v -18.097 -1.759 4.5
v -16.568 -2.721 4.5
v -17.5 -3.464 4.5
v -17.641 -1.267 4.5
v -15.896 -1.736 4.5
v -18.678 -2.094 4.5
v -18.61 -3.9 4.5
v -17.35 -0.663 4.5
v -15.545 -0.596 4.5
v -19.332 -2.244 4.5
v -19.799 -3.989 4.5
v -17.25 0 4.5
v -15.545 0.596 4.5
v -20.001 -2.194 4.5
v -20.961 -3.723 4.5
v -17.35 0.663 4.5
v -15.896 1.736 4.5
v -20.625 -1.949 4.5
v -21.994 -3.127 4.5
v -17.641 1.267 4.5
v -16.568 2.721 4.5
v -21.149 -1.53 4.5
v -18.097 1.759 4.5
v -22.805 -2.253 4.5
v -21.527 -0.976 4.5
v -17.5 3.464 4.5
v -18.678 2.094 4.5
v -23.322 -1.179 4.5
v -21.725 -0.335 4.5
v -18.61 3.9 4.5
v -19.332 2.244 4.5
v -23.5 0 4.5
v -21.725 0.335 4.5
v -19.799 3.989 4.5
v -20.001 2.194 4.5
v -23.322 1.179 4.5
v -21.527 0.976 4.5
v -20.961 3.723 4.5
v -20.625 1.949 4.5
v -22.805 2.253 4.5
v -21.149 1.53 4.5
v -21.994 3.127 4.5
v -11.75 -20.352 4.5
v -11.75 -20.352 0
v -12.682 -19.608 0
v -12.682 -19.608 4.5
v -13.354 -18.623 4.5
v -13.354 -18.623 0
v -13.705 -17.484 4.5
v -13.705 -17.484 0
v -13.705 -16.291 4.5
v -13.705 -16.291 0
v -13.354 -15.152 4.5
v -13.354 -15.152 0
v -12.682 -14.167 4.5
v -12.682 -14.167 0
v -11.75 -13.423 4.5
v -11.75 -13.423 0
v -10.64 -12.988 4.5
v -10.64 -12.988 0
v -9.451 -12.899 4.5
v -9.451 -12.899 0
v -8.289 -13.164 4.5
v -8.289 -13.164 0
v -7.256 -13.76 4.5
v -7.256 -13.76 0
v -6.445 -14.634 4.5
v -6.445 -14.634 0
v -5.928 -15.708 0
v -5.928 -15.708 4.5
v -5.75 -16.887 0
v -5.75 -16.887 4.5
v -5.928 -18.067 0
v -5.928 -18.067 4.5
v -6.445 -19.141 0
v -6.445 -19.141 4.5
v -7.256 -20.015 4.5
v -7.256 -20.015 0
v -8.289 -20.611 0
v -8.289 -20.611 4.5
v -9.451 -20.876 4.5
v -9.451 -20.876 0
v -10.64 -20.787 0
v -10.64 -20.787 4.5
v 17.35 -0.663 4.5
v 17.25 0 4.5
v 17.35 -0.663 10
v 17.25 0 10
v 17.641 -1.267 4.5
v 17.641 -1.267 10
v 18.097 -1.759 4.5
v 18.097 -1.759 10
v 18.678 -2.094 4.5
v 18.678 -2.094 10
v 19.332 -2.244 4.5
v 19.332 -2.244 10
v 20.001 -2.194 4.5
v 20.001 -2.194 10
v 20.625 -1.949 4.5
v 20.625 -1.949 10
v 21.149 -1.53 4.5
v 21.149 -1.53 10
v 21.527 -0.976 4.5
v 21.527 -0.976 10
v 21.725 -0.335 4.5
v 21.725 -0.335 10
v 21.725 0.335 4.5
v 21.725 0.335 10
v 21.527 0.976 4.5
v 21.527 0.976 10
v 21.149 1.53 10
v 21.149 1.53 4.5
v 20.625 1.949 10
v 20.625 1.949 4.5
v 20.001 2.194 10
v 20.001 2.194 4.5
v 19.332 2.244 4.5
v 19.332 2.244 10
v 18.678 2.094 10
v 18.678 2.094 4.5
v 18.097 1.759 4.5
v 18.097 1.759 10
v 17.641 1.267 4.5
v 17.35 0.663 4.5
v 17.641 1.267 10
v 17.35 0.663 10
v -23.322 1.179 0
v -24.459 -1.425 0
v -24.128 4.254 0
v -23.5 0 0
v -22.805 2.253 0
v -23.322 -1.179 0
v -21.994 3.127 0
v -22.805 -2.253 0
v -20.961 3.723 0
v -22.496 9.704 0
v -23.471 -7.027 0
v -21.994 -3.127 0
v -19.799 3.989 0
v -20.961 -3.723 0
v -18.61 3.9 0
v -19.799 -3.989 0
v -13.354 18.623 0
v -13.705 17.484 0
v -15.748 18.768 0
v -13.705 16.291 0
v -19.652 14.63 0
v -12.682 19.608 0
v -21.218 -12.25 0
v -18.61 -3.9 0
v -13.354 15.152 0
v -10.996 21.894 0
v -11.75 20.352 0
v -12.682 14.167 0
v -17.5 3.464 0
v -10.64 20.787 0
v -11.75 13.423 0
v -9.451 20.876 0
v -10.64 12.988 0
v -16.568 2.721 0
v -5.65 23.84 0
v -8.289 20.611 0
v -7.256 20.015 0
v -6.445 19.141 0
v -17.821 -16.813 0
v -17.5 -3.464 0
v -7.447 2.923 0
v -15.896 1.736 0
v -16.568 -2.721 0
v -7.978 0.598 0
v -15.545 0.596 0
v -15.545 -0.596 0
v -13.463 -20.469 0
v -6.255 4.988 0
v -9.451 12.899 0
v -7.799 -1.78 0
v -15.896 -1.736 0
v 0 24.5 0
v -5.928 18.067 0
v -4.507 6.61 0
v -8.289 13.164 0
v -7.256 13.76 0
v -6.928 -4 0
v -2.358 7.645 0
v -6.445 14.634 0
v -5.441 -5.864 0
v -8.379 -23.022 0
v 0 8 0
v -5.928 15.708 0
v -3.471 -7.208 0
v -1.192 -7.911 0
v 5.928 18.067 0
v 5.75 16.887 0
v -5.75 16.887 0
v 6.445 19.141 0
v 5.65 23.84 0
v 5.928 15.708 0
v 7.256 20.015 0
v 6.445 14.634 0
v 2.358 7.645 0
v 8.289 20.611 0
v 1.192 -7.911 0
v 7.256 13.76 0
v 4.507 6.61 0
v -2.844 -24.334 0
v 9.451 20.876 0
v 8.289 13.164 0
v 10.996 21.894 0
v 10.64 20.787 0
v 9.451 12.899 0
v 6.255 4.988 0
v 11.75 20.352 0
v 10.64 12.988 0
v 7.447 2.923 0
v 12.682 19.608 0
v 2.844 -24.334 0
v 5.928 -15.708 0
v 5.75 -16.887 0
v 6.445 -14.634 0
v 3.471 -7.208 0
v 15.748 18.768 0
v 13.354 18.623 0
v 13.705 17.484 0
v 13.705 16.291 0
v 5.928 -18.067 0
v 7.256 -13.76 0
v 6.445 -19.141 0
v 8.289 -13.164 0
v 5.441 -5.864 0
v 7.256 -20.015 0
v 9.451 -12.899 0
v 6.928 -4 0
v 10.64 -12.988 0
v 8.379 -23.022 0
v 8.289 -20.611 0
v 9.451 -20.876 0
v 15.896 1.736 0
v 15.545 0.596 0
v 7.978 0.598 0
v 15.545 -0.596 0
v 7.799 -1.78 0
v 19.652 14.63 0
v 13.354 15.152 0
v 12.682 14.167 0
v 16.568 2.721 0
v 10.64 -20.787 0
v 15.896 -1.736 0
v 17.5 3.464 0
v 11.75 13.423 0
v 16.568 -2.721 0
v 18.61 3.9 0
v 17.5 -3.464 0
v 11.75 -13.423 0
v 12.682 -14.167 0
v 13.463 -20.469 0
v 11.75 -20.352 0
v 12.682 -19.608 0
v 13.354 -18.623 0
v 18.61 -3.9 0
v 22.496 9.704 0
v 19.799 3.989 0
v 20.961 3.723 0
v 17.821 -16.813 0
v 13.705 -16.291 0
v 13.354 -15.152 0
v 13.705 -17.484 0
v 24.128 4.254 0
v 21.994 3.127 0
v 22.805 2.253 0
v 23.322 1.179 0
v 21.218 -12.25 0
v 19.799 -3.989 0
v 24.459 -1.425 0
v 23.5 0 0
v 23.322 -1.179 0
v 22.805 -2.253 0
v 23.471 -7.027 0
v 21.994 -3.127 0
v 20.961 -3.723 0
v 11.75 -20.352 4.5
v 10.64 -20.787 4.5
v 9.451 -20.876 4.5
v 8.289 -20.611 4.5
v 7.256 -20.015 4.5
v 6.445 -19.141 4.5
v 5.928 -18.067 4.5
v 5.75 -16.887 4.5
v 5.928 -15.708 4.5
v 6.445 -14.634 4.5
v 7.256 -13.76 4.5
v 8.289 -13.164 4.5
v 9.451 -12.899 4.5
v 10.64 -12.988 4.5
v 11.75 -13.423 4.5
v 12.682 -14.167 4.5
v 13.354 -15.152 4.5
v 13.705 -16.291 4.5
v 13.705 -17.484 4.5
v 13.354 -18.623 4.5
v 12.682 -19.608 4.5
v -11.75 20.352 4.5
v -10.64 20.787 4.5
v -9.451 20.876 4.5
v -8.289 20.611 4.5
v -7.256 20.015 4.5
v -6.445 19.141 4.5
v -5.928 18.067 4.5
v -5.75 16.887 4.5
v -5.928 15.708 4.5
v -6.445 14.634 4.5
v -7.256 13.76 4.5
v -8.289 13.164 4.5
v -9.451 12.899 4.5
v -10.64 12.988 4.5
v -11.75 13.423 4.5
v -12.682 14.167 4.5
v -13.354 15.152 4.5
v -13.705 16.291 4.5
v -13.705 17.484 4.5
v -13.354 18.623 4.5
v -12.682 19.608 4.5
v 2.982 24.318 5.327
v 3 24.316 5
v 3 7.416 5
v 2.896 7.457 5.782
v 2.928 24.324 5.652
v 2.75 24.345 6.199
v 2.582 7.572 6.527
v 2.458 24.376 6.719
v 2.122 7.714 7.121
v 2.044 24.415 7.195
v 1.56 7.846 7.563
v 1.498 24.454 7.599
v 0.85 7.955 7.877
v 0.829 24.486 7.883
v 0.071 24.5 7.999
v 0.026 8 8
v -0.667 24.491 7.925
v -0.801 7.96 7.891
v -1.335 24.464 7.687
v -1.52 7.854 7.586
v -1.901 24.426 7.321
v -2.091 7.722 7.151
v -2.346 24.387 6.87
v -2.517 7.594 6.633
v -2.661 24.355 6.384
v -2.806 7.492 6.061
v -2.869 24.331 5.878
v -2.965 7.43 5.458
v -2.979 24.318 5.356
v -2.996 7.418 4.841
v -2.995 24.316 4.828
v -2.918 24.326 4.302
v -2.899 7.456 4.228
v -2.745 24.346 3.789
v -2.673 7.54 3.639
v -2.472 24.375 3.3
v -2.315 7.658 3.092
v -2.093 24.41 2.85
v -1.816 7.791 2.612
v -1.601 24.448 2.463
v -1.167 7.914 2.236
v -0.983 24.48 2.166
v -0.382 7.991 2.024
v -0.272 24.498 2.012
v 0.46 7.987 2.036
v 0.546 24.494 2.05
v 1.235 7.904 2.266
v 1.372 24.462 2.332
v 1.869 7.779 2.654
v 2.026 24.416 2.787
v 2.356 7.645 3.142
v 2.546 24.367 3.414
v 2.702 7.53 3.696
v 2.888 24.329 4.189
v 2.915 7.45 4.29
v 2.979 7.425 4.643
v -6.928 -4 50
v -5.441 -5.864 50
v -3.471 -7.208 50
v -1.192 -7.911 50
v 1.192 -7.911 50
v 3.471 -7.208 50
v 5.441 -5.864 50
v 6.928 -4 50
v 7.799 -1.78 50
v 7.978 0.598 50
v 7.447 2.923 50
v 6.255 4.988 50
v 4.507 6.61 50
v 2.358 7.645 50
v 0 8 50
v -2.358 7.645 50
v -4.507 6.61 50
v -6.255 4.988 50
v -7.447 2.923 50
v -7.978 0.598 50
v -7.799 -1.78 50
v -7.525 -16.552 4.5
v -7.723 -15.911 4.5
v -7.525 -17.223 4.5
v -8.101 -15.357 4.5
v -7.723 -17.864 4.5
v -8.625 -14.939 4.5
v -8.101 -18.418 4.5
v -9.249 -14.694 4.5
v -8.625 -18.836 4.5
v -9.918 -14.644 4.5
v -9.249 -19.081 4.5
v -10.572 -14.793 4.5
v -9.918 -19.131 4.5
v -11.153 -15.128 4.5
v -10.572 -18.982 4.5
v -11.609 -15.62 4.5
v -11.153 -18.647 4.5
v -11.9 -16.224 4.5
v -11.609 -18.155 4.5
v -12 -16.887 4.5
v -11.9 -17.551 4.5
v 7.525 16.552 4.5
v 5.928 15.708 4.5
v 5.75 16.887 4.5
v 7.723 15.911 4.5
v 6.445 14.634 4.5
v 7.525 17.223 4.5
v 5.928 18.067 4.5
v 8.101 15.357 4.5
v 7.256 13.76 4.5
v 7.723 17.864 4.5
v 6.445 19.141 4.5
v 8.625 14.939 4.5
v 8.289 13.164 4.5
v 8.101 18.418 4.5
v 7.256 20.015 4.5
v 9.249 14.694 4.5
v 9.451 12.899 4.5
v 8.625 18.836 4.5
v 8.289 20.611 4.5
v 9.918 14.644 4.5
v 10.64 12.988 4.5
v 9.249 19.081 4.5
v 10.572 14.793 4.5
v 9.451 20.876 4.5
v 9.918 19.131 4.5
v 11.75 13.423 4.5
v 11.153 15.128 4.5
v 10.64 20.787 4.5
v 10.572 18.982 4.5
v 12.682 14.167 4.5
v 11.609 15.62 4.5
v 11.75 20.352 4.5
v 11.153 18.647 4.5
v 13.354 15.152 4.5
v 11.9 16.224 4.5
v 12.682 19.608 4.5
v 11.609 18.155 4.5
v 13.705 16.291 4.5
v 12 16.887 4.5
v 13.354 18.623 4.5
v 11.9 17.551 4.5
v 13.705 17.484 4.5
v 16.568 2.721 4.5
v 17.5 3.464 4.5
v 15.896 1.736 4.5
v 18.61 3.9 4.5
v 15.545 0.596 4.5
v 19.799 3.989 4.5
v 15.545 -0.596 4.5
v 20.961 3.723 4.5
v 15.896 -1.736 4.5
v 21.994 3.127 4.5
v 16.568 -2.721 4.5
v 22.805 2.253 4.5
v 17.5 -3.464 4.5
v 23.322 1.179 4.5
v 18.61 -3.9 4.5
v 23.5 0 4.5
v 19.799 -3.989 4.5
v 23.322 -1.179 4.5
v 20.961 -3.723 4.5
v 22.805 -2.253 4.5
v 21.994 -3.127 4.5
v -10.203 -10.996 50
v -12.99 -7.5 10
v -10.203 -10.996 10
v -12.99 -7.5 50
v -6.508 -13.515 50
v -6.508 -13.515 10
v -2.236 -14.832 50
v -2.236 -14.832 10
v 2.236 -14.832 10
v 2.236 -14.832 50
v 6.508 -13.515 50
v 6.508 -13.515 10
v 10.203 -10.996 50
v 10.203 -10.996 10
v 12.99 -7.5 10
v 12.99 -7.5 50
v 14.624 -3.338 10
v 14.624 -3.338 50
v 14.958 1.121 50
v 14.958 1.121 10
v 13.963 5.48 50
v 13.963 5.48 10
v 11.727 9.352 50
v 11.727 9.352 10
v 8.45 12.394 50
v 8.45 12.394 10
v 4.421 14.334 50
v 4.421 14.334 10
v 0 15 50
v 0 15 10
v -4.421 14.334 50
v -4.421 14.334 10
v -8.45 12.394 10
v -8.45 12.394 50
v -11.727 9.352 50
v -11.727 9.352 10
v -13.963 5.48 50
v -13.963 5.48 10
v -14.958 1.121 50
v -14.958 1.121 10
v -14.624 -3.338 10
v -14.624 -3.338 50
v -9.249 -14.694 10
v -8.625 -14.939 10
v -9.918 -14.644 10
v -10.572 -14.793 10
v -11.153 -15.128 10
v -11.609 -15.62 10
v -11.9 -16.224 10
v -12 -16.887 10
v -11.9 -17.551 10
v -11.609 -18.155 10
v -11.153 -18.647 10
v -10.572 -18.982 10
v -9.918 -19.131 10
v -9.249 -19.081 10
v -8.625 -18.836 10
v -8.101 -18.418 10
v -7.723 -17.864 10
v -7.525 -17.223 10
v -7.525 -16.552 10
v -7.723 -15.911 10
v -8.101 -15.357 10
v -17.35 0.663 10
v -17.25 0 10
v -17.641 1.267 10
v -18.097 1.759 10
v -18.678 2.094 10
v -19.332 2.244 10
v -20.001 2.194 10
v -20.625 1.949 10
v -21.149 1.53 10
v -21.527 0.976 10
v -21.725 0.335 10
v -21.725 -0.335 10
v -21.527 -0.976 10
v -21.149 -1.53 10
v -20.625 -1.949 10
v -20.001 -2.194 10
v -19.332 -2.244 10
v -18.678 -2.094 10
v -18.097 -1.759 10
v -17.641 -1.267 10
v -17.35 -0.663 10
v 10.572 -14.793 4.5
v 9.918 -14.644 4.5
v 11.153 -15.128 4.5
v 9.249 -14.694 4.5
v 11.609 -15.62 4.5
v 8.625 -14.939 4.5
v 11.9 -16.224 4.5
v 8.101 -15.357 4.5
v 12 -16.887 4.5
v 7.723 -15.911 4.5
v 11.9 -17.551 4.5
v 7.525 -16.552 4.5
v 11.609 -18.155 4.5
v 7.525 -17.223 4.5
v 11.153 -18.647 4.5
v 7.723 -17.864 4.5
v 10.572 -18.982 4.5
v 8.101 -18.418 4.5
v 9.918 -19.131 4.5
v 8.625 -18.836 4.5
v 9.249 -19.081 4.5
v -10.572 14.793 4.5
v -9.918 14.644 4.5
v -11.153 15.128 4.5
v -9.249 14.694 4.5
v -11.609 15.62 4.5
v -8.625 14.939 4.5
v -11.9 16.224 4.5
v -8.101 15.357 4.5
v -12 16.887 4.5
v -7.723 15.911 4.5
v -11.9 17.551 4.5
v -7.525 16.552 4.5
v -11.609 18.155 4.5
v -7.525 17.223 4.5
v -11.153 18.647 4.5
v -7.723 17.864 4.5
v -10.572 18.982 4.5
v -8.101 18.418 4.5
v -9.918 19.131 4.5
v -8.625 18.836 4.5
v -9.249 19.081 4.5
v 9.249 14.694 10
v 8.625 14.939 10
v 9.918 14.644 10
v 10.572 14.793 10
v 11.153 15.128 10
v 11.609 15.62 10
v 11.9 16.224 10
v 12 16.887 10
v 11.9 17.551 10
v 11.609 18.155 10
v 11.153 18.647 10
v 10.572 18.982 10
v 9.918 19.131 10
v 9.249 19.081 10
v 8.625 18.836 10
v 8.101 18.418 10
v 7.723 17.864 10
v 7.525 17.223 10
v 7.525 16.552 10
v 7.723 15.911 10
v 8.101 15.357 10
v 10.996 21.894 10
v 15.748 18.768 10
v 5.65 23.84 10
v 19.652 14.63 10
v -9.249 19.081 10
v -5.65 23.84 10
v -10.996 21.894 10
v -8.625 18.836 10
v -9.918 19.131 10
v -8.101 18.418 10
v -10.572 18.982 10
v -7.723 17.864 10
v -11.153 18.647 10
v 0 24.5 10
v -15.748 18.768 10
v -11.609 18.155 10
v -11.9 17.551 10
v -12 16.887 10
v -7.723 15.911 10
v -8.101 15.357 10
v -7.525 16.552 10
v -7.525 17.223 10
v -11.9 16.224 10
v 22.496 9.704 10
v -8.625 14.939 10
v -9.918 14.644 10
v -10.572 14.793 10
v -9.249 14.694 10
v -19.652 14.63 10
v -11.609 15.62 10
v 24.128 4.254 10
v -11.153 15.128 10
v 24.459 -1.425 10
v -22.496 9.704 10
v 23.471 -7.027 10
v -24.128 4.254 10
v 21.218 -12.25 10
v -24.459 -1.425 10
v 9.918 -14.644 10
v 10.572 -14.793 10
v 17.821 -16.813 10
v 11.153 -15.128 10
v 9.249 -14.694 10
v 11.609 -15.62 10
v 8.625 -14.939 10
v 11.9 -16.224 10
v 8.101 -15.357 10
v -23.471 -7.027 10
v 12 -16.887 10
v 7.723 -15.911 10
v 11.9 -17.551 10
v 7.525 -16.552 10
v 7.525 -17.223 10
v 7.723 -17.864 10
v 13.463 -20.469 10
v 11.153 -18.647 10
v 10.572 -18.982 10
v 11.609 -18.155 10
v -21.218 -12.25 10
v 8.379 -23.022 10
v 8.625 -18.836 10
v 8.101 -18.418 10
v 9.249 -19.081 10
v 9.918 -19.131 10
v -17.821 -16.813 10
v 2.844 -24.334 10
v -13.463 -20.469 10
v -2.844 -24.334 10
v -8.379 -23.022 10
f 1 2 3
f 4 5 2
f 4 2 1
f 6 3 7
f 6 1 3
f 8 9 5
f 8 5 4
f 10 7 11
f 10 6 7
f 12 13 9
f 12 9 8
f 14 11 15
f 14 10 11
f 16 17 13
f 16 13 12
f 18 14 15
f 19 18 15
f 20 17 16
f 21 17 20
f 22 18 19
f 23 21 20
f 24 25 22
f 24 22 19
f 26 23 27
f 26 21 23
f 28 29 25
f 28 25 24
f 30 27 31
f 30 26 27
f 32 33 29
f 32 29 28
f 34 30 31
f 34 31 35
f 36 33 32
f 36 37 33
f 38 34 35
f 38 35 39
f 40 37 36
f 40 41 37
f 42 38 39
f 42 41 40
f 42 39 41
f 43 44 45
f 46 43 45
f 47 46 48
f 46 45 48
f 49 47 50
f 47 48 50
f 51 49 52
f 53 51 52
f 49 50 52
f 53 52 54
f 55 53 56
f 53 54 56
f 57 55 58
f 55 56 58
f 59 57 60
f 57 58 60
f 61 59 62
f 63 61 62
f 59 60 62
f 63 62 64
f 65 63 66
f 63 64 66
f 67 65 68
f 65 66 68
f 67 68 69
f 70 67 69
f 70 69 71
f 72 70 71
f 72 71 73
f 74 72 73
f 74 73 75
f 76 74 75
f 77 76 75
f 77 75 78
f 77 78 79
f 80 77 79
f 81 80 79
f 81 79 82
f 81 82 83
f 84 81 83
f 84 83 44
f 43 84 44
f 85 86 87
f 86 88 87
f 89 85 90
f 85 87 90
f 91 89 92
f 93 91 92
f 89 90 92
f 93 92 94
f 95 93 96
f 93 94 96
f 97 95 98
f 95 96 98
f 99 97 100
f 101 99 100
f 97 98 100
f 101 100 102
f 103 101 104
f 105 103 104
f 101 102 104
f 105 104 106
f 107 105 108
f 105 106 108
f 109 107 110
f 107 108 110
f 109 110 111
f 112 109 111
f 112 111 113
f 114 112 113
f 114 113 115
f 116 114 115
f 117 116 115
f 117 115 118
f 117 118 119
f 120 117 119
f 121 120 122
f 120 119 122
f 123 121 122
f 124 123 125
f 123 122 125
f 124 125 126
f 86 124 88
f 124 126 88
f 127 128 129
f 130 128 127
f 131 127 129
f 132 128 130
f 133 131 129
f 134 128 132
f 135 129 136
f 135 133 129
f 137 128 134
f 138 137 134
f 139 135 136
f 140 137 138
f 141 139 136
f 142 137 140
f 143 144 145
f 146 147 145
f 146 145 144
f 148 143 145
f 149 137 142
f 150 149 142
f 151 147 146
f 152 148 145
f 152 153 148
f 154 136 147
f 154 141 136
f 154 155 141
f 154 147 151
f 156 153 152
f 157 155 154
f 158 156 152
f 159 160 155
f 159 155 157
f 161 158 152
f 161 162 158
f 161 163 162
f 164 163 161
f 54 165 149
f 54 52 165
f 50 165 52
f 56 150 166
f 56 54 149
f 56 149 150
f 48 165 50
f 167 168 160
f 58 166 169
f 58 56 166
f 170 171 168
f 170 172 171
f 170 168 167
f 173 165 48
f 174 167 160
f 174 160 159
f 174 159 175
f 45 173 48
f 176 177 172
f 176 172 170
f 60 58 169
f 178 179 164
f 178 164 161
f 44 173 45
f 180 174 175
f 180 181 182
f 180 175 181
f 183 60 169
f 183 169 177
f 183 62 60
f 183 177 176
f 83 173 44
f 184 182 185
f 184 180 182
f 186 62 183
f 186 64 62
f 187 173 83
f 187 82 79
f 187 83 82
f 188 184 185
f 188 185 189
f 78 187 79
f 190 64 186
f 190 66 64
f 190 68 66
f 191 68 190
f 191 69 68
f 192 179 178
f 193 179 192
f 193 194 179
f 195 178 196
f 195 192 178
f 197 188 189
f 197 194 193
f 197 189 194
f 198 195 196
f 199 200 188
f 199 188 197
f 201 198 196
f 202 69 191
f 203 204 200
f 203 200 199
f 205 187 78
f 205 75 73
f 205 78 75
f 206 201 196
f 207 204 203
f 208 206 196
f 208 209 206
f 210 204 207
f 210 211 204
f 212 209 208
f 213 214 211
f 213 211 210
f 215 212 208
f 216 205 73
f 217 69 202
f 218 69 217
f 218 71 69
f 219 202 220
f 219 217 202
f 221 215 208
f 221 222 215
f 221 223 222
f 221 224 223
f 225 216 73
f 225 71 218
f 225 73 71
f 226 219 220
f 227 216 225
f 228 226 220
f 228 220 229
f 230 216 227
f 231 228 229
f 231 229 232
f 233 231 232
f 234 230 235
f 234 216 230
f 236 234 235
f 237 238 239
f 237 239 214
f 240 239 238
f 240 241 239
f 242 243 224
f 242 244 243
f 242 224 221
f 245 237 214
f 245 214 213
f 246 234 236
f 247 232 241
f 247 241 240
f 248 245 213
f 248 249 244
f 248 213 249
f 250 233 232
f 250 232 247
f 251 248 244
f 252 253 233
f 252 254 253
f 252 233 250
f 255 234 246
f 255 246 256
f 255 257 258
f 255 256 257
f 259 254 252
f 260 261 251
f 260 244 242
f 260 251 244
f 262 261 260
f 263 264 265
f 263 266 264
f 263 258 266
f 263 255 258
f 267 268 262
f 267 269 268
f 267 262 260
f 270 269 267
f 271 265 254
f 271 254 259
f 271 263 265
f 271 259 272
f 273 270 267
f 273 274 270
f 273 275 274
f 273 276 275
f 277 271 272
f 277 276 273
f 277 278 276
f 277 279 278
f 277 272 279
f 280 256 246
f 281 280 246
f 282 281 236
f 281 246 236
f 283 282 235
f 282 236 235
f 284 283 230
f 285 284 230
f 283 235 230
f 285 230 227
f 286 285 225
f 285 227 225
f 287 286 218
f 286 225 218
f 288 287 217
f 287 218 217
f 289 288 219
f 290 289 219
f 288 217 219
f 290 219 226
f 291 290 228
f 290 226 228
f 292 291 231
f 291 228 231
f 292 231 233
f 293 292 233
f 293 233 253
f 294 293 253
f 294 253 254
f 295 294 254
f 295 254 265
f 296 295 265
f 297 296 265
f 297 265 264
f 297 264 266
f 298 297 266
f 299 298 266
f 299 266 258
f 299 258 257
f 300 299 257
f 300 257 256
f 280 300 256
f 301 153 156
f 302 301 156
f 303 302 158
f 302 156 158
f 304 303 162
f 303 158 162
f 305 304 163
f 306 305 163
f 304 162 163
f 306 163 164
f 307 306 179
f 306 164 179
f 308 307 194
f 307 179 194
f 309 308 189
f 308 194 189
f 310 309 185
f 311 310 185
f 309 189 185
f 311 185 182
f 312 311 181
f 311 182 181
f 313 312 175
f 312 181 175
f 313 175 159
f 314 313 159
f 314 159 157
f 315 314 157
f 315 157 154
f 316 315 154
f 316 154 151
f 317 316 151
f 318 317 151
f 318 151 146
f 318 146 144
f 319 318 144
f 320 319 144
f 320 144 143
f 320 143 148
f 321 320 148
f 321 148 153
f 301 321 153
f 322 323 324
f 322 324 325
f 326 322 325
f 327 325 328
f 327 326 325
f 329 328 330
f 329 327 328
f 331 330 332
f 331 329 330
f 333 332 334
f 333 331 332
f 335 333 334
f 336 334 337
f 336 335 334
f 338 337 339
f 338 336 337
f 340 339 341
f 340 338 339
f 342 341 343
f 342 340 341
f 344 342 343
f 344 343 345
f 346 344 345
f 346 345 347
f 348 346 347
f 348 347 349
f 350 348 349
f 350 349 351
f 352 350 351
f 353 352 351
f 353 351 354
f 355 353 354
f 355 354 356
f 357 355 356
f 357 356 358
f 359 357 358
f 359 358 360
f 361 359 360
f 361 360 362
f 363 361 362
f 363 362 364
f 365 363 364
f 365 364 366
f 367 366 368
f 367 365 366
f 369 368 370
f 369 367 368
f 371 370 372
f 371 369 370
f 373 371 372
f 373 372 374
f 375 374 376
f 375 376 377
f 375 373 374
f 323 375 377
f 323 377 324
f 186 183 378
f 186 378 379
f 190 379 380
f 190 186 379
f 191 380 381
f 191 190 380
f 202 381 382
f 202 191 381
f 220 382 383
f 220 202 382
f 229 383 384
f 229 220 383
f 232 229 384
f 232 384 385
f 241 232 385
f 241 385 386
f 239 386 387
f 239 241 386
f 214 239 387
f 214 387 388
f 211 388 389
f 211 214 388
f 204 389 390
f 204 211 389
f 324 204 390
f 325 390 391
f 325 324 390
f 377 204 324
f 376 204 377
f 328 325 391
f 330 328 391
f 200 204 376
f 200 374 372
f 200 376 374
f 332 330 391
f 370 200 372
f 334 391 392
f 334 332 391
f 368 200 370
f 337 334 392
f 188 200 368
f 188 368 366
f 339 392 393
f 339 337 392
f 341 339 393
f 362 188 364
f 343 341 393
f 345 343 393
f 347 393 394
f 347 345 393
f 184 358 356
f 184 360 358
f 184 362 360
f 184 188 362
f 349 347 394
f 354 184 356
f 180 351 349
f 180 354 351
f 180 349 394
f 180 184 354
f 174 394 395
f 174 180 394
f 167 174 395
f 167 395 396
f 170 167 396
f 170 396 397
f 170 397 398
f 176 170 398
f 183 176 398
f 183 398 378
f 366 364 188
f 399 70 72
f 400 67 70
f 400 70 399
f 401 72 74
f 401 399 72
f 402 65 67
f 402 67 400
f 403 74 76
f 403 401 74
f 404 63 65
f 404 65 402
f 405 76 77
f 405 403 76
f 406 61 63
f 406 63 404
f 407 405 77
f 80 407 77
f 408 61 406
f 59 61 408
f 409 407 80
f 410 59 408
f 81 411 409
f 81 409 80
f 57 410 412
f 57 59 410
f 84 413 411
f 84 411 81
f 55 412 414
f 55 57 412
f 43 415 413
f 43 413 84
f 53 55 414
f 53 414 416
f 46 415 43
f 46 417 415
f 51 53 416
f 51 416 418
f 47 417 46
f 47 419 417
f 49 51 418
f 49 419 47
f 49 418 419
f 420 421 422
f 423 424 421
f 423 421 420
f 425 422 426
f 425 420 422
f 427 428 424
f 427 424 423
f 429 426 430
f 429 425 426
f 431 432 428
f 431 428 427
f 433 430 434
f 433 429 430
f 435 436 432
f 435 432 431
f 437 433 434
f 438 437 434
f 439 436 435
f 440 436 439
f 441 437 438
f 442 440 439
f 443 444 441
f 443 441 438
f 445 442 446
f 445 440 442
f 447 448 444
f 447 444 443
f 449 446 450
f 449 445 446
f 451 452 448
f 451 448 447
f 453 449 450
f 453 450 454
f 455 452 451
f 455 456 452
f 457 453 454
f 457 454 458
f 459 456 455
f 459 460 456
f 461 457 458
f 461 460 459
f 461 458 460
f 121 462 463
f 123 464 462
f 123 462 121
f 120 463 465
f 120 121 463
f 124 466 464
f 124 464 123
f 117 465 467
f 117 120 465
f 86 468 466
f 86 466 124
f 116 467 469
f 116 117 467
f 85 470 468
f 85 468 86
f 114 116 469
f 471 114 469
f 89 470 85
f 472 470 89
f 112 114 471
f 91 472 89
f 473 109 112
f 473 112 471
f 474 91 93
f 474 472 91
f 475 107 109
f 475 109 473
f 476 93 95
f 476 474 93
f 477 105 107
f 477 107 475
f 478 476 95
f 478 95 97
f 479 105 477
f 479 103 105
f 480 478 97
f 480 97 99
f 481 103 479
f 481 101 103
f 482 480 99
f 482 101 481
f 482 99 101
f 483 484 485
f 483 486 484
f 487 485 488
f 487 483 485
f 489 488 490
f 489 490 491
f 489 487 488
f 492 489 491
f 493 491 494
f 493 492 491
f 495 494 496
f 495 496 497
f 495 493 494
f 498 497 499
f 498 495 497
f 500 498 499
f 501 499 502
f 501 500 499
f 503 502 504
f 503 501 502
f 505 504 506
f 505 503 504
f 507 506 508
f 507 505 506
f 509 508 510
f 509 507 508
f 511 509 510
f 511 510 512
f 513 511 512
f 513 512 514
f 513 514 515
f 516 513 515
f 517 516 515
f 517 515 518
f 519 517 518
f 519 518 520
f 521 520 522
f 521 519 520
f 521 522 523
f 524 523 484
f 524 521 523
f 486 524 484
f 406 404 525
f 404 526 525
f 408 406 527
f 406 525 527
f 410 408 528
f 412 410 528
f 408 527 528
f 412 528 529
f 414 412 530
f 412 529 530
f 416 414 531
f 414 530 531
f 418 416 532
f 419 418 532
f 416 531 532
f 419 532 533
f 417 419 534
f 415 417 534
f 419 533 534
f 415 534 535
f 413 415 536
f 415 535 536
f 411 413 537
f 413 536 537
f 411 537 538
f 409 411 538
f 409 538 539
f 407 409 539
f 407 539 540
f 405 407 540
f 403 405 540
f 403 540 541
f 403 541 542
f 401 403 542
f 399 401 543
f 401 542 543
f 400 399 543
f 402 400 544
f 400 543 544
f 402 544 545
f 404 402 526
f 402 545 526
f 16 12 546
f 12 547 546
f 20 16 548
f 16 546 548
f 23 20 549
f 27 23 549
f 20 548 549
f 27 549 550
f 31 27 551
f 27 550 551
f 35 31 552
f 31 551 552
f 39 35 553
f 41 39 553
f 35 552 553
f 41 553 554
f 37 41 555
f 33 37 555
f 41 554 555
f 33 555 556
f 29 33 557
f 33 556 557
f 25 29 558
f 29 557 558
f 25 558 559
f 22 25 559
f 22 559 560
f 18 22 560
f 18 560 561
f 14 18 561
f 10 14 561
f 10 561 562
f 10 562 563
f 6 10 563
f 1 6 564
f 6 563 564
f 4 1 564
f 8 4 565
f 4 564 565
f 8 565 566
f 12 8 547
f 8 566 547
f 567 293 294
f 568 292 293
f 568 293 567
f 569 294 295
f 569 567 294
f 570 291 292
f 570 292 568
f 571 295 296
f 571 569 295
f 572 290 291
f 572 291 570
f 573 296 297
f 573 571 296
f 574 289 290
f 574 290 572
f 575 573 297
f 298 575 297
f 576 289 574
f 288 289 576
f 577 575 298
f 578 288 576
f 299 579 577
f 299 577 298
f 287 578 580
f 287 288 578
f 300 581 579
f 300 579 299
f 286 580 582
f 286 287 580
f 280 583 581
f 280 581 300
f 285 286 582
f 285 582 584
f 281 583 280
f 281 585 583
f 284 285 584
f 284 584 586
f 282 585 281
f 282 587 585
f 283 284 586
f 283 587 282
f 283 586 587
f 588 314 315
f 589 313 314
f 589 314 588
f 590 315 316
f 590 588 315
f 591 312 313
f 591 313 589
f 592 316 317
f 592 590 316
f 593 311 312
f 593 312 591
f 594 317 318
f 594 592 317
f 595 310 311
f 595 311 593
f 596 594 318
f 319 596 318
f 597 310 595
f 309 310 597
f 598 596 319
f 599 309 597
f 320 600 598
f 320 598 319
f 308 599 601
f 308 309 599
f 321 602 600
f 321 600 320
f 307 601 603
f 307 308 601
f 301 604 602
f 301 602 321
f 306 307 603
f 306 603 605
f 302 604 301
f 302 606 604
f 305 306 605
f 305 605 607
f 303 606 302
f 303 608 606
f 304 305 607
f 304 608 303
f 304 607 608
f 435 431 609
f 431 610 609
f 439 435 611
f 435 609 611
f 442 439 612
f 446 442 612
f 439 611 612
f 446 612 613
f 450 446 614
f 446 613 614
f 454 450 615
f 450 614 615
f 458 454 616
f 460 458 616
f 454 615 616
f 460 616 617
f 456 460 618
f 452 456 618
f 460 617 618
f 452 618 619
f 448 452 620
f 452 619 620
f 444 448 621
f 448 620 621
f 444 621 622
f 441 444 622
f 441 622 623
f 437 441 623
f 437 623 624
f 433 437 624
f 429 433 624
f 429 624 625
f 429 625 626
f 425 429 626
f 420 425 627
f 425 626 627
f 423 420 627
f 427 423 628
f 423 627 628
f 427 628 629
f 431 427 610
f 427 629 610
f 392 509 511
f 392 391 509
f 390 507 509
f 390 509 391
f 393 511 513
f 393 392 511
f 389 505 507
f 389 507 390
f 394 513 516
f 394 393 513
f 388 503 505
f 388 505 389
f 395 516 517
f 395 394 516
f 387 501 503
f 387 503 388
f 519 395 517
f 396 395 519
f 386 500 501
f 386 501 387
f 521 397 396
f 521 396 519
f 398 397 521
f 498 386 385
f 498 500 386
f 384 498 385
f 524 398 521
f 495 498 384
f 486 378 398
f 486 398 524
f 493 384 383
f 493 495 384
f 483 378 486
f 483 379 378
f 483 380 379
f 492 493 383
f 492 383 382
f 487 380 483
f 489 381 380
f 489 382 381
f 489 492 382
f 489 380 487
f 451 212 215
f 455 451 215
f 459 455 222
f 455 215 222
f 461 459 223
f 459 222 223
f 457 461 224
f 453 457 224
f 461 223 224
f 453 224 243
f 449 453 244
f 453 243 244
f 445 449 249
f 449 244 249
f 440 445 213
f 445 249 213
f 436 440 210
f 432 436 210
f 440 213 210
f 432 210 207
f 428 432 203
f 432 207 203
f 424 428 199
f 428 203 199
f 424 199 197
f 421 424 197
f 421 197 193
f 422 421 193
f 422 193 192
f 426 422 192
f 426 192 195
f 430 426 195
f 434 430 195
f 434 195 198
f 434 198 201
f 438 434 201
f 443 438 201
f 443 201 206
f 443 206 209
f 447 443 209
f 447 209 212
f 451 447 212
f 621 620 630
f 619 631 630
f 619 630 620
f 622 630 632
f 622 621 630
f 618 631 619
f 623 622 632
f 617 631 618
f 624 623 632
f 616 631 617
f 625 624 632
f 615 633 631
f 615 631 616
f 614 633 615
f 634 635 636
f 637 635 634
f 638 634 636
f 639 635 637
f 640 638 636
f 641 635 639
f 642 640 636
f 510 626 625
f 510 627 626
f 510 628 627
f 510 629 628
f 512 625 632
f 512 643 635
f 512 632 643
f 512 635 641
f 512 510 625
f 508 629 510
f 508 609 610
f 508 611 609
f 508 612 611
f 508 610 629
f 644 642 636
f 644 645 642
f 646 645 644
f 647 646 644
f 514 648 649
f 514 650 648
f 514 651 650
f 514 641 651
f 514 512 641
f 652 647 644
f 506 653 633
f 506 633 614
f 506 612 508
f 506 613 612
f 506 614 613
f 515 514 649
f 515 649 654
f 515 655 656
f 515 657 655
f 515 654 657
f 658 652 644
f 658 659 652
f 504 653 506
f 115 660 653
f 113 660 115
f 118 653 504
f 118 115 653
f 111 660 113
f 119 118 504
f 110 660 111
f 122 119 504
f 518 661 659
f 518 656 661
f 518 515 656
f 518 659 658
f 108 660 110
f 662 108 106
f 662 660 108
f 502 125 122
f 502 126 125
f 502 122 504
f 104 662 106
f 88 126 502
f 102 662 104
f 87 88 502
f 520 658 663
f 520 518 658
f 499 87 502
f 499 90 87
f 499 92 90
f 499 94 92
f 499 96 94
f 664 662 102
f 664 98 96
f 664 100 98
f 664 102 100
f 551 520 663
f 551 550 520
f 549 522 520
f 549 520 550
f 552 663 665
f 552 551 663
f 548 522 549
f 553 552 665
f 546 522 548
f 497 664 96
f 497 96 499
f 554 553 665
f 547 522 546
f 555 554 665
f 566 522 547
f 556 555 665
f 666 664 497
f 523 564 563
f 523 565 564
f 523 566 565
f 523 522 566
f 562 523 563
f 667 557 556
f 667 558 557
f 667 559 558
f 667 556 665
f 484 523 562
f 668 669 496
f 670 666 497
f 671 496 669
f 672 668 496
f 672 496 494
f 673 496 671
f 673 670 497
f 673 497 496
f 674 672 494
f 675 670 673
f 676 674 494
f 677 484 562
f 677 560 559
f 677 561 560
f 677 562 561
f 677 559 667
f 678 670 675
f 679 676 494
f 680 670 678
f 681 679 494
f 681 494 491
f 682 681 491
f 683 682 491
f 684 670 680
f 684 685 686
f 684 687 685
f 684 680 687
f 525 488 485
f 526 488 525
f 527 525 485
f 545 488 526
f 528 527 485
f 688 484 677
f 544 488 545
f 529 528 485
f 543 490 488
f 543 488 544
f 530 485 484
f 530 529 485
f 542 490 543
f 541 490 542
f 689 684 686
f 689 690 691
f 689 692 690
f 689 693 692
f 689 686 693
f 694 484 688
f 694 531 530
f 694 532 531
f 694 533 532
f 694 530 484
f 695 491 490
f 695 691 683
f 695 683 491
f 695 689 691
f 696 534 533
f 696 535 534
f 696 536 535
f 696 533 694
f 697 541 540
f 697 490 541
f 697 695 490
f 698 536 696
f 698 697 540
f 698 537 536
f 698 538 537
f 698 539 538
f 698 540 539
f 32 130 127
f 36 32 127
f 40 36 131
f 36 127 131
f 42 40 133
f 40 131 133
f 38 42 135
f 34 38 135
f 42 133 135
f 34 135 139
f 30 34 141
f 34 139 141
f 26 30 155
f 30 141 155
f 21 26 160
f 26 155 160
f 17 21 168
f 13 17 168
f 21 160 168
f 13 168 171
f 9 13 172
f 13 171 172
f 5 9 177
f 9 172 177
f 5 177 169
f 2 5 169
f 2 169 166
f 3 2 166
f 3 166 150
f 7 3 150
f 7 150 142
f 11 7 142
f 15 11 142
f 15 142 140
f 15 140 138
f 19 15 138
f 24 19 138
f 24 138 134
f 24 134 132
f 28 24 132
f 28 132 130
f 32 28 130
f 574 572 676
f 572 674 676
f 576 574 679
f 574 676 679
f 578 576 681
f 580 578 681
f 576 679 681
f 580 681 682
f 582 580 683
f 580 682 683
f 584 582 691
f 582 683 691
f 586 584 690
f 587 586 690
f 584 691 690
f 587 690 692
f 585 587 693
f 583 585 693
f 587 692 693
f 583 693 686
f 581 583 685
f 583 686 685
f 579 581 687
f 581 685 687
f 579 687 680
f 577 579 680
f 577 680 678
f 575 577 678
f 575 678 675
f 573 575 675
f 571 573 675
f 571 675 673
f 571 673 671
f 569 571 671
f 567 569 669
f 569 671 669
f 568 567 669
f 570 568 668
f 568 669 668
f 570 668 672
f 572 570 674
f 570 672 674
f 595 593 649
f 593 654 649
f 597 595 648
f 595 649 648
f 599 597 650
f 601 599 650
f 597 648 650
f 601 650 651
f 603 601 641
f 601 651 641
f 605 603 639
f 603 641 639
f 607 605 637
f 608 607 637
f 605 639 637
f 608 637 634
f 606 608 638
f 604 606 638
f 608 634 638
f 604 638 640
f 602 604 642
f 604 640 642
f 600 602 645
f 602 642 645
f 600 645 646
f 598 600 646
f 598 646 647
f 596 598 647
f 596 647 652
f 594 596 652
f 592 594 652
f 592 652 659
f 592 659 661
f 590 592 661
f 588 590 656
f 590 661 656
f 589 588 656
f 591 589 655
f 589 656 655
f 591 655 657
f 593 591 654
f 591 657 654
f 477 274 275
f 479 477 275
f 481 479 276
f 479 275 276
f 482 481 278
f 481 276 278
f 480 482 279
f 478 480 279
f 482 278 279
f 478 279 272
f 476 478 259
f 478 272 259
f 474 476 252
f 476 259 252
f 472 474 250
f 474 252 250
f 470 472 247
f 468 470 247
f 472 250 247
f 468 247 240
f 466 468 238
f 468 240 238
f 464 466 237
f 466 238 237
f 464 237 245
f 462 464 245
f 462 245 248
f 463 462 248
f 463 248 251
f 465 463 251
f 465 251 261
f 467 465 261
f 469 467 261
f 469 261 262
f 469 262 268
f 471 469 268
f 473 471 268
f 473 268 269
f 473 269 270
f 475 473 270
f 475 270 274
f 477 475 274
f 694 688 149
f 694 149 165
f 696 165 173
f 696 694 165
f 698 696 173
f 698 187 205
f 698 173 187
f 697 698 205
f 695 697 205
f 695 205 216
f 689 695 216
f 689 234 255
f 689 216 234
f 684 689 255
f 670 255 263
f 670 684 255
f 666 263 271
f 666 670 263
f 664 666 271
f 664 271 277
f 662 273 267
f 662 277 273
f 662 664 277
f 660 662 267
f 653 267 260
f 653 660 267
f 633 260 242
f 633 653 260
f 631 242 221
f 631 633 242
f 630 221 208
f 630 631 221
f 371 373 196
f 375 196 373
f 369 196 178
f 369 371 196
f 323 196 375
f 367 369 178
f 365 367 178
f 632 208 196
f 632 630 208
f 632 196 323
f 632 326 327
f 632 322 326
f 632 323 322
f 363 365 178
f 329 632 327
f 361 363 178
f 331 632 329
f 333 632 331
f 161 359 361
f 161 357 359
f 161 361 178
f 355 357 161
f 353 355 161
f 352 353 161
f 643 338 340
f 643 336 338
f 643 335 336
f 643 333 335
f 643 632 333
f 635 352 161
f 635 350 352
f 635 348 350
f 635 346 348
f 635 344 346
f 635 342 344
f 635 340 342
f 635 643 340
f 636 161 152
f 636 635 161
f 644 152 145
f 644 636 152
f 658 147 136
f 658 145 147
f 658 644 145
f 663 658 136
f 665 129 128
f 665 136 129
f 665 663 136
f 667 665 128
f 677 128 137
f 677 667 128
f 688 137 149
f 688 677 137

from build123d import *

# Parameters (mm, degrees)
F1_ANGLE_BACK  = 30
F1_ANGLE       = 60
F3_D           = 4.5
F3_CBORE_D     = 8
F3_CBORE_DEPTH = 4.5
F4_COUNT       = 6
F8_R           = 3
F9_DEPTH       = 25


with BuildPart() as f1:
    # F0 (on Front) → F1 (revolve)
    with BuildSketch(Plane.XZ, mode=Mode.PRIVATE) as f1_sk:
        Polygon((8, 50), (8, 0), (24.5, 0), (24.5, 10), (15, 10), (15, 50), align=None)
    revolve(f1_sk.sketch.rotate(Axis((0, 0, 41.6573854163), (0, 0, 1)), -F1_ANGLE_BACK), axis=Axis((0, 0, 41.6573854163), (0, 0, 1)), revolution_arc=F1_ANGLE)

    # F3 (through all)
    with Locations(Plane(origin=(0, 0, 0), x_dir=(1, 0, 0), z_dir=(0, 0, -1))):
        with Locations((19.5, 0)):
            CounterBoreHole(F3_D / 2, F3_CBORE_D / 2, F3_CBORE_DEPTH)


with BuildPart() as f4_1:
    # F4: instance of F1
    add(f1.part.rotate(Axis((0, 0, 41.6573854163), (0, 0, -1)), 1 * 360 / F4_COUNT))


with BuildPart() as f4_2:
    # F4: instance of F1
    add(f1.part.rotate(Axis((0, 0, 41.6573854163), (0, 0, -1)), 2 * 360 / F4_COUNT))


with BuildPart() as f4_3:
    # F4: instance of F1
    add(f1.part.rotate(Axis((0, 0, 41.6573854163), (0, 0, -1)), 3 * 360 / F4_COUNT))


with BuildPart() as f4_4:
    # F4: instance of F1
    add(f1.part.rotate(Axis((0, 0, 41.6573854163), (0, 0, -1)), 4 * 360 / F4_COUNT))


with BuildPart() as f4_5:
    # F4: instance of F1
    add(f1.part.rotate(Axis((0, 0, 41.6573854163), (0, 0, -1)), 5 * 360 / F4_COUNT))


with BuildPart() as f4_1_1:
    add(f4_1.part)

    # F5: union F1, F4_5, F4_4, F4_3, F4_2
    add(f1.part)
    add(f4_5.part)
    add(f4_4.part)
    add(f4_3.part)
    add(f4_2.part)

    # F8 (on plane+point) → F9 (cut)
    with BuildSketch(Plane.XZ.offset(-24.5)):
        with Locations((0, 5)):
            Circle(F8_R)
    extrude(amount=F9_DEPTH, mode=Mode.SUBTRACT)


solid = f4_1_1.part
